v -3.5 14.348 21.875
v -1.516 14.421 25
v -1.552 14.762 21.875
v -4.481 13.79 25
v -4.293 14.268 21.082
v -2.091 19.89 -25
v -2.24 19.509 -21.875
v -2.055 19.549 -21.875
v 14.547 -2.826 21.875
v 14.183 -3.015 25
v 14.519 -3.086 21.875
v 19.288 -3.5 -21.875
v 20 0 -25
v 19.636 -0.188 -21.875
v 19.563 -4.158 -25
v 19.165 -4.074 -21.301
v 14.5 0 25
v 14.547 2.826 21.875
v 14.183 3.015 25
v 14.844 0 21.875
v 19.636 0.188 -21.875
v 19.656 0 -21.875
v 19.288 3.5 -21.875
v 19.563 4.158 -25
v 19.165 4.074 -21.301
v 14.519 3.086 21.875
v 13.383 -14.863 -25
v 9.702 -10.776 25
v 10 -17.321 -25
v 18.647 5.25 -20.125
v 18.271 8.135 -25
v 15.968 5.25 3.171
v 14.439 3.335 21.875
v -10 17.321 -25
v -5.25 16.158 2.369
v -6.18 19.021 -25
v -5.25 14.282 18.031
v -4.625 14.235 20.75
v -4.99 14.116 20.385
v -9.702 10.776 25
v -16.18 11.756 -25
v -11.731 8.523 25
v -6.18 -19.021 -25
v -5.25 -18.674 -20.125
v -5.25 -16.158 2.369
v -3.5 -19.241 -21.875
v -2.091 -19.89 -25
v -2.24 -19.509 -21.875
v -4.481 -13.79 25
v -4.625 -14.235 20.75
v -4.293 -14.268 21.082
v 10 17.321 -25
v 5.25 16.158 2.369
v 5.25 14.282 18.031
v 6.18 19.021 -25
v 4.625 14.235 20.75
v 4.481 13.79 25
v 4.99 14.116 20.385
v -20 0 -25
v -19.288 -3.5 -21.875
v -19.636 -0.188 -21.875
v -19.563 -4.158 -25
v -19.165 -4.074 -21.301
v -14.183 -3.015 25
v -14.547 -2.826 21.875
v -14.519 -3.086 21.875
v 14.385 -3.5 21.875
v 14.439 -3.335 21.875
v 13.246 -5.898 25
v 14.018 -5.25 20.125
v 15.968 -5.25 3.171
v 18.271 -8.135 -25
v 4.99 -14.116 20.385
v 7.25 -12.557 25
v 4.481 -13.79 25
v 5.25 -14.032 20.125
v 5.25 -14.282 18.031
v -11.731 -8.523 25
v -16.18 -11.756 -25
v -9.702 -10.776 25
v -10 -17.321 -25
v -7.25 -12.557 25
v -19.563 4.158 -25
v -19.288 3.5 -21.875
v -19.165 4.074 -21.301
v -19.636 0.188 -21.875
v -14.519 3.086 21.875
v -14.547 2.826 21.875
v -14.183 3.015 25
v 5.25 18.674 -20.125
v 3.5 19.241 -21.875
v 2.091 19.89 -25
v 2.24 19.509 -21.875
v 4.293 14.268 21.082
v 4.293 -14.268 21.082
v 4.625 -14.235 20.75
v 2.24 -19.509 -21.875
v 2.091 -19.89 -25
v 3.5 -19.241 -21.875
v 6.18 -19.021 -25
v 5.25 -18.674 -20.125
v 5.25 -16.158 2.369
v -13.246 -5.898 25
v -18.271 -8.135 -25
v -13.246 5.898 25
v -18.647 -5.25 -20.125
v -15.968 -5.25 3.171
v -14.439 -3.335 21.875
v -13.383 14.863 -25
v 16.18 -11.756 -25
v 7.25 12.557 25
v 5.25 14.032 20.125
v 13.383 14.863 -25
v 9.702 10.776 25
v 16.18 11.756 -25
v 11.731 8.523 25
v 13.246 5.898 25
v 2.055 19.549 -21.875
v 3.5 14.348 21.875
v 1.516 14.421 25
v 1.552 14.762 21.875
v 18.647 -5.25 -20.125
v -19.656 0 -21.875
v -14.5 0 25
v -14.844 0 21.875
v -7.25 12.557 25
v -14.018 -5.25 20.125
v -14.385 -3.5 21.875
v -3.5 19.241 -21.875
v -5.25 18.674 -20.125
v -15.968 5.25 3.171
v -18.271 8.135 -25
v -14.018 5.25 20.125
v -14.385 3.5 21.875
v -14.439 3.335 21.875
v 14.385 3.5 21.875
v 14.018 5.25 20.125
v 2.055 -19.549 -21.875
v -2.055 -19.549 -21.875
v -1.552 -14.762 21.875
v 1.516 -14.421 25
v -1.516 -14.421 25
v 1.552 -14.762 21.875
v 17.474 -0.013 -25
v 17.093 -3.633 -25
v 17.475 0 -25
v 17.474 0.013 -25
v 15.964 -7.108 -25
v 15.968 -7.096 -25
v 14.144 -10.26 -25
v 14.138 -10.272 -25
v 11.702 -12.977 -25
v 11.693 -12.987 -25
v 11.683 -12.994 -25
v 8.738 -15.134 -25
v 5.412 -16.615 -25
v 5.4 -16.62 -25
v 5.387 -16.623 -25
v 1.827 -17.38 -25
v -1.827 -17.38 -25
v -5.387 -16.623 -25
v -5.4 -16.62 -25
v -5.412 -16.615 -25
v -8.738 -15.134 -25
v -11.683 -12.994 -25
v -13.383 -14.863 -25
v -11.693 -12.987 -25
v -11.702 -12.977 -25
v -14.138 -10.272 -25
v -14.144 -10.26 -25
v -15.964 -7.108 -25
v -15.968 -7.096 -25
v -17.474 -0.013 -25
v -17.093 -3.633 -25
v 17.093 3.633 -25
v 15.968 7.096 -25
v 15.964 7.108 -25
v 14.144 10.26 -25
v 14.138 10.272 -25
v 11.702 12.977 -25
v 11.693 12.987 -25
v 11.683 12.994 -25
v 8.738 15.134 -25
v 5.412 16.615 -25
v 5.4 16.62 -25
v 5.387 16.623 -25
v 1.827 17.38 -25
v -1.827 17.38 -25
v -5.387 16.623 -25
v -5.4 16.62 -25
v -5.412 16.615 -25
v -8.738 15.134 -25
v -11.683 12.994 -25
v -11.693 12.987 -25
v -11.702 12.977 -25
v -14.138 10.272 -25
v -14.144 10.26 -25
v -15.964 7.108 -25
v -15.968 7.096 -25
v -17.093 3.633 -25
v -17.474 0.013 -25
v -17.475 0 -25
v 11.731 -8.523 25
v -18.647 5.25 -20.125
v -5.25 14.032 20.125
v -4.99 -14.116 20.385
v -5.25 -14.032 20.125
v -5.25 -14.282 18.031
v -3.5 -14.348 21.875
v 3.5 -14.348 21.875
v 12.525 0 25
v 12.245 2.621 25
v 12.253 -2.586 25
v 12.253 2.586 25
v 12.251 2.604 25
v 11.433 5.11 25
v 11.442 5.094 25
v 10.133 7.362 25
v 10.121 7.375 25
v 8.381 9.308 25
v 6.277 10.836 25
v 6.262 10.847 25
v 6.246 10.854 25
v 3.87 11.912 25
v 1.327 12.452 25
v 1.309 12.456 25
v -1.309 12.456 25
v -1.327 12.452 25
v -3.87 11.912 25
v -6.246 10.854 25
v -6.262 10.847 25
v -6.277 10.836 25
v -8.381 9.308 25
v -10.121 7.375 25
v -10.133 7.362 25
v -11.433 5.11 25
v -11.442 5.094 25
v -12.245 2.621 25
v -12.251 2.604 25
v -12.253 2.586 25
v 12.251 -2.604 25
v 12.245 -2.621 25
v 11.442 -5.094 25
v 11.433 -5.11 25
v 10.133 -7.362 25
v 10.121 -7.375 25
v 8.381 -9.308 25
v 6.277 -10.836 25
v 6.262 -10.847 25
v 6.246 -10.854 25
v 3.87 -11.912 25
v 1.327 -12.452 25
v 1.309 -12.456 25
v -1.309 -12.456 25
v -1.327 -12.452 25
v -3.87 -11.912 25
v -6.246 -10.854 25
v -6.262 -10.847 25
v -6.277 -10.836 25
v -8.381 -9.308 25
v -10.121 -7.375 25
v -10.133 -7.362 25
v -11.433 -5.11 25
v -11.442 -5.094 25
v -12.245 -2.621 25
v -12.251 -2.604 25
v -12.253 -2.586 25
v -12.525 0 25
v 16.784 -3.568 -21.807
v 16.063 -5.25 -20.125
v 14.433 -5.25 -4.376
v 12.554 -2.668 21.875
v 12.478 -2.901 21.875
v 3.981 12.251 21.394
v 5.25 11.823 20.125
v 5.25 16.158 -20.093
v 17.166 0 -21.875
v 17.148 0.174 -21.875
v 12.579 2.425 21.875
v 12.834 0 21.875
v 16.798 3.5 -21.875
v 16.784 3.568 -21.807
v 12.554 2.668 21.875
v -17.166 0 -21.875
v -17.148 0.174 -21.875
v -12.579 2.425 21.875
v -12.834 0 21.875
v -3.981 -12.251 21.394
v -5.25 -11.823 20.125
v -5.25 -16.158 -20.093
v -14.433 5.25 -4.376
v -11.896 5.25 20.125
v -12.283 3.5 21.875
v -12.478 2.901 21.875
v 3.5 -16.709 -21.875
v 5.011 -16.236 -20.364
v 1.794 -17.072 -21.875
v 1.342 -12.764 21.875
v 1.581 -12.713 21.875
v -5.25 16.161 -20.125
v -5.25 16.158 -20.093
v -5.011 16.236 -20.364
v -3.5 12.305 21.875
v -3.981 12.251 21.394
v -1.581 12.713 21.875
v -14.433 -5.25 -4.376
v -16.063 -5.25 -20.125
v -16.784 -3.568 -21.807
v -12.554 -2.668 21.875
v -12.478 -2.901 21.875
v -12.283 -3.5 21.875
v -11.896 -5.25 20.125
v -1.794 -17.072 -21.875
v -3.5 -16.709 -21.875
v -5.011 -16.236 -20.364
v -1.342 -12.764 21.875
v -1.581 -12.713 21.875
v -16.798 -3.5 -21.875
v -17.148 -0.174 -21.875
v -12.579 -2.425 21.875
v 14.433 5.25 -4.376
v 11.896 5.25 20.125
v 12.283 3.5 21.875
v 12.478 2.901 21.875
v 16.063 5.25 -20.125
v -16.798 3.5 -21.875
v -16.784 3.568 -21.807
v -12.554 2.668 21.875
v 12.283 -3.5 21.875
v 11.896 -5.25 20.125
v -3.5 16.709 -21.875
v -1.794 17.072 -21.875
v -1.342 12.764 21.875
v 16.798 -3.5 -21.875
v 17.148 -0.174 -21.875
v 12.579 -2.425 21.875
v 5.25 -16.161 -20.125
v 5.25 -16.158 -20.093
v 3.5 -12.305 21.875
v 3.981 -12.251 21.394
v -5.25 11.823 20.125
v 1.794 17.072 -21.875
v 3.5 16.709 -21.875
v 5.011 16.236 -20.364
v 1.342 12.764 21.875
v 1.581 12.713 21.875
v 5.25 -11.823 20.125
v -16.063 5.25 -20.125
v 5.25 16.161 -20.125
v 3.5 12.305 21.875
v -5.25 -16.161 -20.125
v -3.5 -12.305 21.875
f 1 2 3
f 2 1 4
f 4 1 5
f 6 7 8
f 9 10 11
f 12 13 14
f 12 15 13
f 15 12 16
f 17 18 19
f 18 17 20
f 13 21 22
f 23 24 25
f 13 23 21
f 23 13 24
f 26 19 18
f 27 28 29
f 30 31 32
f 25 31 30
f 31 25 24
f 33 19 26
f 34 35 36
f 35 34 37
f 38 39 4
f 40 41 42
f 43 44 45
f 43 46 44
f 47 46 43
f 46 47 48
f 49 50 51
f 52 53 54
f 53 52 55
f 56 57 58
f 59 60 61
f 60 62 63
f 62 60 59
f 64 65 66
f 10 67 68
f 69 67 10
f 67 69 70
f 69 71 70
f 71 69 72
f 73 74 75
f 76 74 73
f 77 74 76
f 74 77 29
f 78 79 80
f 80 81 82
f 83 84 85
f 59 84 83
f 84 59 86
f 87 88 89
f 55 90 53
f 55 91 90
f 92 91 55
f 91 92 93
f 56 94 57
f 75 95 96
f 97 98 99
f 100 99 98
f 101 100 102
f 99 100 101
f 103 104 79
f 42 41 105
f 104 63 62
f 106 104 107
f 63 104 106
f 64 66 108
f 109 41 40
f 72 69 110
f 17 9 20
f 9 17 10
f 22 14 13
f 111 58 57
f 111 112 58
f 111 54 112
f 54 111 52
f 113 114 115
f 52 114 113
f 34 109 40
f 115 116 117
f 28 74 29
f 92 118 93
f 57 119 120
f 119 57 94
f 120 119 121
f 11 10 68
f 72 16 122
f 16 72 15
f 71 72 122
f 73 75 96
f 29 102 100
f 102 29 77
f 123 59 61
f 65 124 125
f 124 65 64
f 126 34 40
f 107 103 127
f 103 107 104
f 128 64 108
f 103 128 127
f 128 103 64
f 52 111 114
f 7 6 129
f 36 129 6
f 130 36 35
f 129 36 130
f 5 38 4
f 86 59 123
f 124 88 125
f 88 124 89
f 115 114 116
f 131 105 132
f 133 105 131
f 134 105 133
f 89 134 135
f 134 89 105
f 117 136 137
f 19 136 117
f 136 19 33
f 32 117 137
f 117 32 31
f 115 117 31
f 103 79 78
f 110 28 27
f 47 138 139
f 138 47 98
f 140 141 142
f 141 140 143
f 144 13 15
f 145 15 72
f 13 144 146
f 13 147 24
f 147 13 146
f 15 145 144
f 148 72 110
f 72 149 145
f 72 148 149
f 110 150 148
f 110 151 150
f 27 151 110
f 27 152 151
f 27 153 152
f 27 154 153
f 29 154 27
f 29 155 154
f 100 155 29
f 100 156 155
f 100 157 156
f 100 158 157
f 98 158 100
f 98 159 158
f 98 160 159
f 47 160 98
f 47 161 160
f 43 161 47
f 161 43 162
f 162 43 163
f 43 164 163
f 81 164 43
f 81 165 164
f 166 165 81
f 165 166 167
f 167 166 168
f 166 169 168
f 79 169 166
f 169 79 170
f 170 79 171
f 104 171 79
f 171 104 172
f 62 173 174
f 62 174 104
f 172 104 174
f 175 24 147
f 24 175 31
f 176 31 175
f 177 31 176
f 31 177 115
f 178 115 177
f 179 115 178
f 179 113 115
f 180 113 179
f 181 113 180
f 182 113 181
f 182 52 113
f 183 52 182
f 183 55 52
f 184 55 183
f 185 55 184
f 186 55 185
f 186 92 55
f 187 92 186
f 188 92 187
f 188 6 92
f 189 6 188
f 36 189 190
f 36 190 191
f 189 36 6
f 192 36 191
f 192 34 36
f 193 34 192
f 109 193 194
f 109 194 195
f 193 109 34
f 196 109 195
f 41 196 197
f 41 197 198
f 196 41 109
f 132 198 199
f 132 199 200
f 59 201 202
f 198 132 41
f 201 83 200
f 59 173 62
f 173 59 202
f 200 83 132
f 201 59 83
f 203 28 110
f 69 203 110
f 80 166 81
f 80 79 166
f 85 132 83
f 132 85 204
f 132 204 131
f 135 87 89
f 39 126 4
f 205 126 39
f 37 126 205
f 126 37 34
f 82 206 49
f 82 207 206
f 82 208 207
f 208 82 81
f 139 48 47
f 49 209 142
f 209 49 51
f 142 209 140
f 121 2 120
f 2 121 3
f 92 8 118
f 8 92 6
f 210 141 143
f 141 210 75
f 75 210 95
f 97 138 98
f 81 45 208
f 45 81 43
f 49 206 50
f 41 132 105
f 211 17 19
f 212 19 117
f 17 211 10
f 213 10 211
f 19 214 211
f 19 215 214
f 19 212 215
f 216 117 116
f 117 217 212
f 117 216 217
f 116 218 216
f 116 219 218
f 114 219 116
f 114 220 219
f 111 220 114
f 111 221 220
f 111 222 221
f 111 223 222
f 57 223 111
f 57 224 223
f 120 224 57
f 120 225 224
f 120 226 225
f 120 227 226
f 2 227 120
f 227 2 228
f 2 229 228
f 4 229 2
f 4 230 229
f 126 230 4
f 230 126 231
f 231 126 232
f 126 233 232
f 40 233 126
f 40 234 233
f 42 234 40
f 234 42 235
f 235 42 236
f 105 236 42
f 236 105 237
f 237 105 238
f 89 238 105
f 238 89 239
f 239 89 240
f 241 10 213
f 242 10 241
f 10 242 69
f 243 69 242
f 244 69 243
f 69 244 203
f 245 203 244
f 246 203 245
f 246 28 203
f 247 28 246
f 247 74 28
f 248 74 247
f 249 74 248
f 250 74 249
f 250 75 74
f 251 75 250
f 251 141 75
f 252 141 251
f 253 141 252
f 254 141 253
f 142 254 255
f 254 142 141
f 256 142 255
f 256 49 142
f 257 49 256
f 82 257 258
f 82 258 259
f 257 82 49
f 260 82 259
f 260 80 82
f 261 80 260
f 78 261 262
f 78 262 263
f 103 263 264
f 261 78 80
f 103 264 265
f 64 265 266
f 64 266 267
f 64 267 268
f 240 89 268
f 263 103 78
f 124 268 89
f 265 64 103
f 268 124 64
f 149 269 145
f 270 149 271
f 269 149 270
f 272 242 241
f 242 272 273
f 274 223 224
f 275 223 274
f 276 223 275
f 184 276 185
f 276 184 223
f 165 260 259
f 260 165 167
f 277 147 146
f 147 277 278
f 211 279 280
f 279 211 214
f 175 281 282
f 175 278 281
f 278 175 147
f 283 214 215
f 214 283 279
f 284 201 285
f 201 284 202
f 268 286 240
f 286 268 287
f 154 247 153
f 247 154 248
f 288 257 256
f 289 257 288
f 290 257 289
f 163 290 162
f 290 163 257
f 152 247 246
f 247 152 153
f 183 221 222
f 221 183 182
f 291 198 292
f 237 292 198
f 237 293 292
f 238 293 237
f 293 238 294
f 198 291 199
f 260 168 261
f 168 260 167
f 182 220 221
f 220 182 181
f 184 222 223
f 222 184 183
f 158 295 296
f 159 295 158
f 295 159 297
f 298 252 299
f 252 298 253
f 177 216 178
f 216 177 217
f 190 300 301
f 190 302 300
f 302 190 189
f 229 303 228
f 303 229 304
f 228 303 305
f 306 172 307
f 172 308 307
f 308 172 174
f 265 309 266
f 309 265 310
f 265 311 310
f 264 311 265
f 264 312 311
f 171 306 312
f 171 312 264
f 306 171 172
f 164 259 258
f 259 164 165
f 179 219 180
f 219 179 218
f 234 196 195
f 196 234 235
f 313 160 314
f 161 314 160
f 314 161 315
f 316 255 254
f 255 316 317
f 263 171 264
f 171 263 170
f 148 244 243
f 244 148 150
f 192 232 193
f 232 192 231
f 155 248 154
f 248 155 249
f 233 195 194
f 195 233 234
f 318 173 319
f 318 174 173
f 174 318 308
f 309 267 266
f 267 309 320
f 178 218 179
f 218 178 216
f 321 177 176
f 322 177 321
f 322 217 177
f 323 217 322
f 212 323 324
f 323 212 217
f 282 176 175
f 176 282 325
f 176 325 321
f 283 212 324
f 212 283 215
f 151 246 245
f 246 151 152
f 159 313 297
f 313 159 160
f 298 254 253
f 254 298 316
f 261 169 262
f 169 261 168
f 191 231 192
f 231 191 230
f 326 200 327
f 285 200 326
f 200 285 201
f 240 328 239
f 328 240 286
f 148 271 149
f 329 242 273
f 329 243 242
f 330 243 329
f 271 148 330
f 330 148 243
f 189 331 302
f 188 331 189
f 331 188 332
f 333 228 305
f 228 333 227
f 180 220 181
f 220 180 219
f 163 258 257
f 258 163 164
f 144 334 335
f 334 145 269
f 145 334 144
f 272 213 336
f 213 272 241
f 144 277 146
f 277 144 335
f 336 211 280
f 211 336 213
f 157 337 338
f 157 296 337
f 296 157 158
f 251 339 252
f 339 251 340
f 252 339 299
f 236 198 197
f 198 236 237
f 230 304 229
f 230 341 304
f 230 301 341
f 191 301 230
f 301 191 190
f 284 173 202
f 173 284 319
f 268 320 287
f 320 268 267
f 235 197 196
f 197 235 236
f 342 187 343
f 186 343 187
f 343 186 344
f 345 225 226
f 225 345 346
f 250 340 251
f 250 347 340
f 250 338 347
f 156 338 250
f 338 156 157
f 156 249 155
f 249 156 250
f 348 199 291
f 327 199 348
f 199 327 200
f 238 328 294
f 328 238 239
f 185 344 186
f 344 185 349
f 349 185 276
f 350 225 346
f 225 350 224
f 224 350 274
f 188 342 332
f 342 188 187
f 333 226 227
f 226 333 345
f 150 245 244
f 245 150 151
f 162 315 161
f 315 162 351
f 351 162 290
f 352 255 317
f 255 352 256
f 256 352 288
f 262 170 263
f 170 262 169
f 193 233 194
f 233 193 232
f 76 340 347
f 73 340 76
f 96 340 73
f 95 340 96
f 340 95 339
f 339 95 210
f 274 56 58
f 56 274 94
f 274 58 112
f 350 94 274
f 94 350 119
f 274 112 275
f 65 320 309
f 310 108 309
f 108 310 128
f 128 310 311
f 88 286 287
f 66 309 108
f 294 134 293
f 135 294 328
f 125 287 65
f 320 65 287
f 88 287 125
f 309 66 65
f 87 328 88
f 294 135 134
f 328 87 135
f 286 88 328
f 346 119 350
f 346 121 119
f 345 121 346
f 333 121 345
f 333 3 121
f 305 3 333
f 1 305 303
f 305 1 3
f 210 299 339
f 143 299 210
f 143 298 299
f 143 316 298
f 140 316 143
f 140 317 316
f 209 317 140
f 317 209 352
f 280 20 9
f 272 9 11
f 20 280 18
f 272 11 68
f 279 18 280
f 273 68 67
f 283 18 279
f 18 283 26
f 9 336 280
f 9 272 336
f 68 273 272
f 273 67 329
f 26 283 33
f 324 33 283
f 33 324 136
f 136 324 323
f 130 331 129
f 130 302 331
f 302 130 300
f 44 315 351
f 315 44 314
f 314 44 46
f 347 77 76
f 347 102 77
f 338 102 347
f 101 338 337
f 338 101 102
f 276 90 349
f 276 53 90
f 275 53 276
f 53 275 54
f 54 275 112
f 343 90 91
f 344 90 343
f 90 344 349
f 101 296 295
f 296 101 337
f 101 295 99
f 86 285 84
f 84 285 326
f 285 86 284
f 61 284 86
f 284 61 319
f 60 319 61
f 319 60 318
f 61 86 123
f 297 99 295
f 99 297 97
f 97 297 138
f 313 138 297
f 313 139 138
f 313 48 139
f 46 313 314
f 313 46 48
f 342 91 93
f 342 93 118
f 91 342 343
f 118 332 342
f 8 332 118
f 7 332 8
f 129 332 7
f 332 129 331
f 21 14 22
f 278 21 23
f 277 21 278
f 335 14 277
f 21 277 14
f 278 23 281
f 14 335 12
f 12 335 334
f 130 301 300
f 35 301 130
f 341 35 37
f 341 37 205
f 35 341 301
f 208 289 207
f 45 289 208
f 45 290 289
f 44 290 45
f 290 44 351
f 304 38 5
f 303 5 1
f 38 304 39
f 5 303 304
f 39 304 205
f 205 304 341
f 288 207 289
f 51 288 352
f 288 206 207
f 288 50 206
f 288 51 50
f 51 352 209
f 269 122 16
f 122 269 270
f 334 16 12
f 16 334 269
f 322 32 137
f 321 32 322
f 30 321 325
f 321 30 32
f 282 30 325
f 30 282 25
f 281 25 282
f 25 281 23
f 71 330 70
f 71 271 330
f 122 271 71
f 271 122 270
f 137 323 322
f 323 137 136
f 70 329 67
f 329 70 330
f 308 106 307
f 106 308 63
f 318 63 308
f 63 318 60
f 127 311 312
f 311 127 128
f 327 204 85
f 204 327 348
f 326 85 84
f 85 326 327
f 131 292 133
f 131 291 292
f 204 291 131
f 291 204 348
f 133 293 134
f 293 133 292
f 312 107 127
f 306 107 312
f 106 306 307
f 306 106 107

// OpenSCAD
// To my college friends back home, the first to hopefuly many
// openSCAD designs to better aid our fellow men and women


// ~~~~~~~~~~~~~~~~~~~~~~~~~~~~~~~~~~~~~~~~~~~~~~~~~~//
// OVERALL STAND DIMENSIONS // 
// Overall Height of Stand
height = 50;
// This is the overall height of the stand
// to find out how high you need to make your stand
// measure the distance from where you want your bowl
// to be resting on from the ground
// then measure the diameter of the bowl at that point
// and enter that value into the diameter value
// Top diameter of stand
top_diameter = 25;
// this is where you enter the value from the previous step

// Bottom diameter of stand
base_diameter = 35;
// this is just an eyeballed value, a wider base is more stable
// but will take more time to print beause of more material and
// more support material

// Offset thickness of top ring
topring_offset = 2;
// this is the offeset for the generating the outside diameter of
// the top and bottom rings
// any positive value will work
// Offset thickness of bottom ring
botring_offset = 2.5;
// I'd recommend at least 2 for topring_offset and 2.5 or more for botring_offset



//~~~~~~~~~~~~~~~~~~~~~~~~~~~~~~~~~~~~~~~~~~~~~~~~~~~~//
// RECTANGULAR CUTS DIMENSIONS //
// Spacing from cuts to the ends
end_thickness = 8;
// this will determine how tall your rectangular cuts are compared the 
// the height
// How many cuts
cuts = 4;
// this is how many cuts you will have on your stand
// how wide the cuts are
cut_width = 7;
// this is how wide your rectangular cuts will be on the stand
// too big and your stand will have no supporting beams
// Turn fillets on/off
fillet = "true"; //[false,true]
// set to true if you want fillets on the corners of the
// bowl stand cuts



top_radius = top_diameter/2;
base_radius = base_diameter/2;

module bowlStand2() {
    difference() {
        difference() {
            cylinder(h = height, r1 = base_radius+botring_offset, r2 = top_radius+topring_offset, center = true);
            scale([1,1,1.01])
            cylinder(h = height, r1 = base_radius, r2 = top_radius, center = true);
        }
        
        union() {
            for (i = [0:cuts]) {
                rotate([0,0,i*360/cuts]) 
                RoundedSquareCut();
            }
        }
    }
}

module RoundedSquareCut() {
    cut_height = (height - (end_thickness + cut_width/4));
    rotate([90,0,0]) 
    linear_extrude((base_radius+top_radius)*2)
        
    if (fillet == "true") {
        offset(cut_width/4)
        // translate([0,0,0]) 
        square([cut_width,cut_height], center = true);
    } else {
        // translate([0,0,0]) 
        square([cut_width,cut_height], center = true);
    }
}

bowlStand2();

